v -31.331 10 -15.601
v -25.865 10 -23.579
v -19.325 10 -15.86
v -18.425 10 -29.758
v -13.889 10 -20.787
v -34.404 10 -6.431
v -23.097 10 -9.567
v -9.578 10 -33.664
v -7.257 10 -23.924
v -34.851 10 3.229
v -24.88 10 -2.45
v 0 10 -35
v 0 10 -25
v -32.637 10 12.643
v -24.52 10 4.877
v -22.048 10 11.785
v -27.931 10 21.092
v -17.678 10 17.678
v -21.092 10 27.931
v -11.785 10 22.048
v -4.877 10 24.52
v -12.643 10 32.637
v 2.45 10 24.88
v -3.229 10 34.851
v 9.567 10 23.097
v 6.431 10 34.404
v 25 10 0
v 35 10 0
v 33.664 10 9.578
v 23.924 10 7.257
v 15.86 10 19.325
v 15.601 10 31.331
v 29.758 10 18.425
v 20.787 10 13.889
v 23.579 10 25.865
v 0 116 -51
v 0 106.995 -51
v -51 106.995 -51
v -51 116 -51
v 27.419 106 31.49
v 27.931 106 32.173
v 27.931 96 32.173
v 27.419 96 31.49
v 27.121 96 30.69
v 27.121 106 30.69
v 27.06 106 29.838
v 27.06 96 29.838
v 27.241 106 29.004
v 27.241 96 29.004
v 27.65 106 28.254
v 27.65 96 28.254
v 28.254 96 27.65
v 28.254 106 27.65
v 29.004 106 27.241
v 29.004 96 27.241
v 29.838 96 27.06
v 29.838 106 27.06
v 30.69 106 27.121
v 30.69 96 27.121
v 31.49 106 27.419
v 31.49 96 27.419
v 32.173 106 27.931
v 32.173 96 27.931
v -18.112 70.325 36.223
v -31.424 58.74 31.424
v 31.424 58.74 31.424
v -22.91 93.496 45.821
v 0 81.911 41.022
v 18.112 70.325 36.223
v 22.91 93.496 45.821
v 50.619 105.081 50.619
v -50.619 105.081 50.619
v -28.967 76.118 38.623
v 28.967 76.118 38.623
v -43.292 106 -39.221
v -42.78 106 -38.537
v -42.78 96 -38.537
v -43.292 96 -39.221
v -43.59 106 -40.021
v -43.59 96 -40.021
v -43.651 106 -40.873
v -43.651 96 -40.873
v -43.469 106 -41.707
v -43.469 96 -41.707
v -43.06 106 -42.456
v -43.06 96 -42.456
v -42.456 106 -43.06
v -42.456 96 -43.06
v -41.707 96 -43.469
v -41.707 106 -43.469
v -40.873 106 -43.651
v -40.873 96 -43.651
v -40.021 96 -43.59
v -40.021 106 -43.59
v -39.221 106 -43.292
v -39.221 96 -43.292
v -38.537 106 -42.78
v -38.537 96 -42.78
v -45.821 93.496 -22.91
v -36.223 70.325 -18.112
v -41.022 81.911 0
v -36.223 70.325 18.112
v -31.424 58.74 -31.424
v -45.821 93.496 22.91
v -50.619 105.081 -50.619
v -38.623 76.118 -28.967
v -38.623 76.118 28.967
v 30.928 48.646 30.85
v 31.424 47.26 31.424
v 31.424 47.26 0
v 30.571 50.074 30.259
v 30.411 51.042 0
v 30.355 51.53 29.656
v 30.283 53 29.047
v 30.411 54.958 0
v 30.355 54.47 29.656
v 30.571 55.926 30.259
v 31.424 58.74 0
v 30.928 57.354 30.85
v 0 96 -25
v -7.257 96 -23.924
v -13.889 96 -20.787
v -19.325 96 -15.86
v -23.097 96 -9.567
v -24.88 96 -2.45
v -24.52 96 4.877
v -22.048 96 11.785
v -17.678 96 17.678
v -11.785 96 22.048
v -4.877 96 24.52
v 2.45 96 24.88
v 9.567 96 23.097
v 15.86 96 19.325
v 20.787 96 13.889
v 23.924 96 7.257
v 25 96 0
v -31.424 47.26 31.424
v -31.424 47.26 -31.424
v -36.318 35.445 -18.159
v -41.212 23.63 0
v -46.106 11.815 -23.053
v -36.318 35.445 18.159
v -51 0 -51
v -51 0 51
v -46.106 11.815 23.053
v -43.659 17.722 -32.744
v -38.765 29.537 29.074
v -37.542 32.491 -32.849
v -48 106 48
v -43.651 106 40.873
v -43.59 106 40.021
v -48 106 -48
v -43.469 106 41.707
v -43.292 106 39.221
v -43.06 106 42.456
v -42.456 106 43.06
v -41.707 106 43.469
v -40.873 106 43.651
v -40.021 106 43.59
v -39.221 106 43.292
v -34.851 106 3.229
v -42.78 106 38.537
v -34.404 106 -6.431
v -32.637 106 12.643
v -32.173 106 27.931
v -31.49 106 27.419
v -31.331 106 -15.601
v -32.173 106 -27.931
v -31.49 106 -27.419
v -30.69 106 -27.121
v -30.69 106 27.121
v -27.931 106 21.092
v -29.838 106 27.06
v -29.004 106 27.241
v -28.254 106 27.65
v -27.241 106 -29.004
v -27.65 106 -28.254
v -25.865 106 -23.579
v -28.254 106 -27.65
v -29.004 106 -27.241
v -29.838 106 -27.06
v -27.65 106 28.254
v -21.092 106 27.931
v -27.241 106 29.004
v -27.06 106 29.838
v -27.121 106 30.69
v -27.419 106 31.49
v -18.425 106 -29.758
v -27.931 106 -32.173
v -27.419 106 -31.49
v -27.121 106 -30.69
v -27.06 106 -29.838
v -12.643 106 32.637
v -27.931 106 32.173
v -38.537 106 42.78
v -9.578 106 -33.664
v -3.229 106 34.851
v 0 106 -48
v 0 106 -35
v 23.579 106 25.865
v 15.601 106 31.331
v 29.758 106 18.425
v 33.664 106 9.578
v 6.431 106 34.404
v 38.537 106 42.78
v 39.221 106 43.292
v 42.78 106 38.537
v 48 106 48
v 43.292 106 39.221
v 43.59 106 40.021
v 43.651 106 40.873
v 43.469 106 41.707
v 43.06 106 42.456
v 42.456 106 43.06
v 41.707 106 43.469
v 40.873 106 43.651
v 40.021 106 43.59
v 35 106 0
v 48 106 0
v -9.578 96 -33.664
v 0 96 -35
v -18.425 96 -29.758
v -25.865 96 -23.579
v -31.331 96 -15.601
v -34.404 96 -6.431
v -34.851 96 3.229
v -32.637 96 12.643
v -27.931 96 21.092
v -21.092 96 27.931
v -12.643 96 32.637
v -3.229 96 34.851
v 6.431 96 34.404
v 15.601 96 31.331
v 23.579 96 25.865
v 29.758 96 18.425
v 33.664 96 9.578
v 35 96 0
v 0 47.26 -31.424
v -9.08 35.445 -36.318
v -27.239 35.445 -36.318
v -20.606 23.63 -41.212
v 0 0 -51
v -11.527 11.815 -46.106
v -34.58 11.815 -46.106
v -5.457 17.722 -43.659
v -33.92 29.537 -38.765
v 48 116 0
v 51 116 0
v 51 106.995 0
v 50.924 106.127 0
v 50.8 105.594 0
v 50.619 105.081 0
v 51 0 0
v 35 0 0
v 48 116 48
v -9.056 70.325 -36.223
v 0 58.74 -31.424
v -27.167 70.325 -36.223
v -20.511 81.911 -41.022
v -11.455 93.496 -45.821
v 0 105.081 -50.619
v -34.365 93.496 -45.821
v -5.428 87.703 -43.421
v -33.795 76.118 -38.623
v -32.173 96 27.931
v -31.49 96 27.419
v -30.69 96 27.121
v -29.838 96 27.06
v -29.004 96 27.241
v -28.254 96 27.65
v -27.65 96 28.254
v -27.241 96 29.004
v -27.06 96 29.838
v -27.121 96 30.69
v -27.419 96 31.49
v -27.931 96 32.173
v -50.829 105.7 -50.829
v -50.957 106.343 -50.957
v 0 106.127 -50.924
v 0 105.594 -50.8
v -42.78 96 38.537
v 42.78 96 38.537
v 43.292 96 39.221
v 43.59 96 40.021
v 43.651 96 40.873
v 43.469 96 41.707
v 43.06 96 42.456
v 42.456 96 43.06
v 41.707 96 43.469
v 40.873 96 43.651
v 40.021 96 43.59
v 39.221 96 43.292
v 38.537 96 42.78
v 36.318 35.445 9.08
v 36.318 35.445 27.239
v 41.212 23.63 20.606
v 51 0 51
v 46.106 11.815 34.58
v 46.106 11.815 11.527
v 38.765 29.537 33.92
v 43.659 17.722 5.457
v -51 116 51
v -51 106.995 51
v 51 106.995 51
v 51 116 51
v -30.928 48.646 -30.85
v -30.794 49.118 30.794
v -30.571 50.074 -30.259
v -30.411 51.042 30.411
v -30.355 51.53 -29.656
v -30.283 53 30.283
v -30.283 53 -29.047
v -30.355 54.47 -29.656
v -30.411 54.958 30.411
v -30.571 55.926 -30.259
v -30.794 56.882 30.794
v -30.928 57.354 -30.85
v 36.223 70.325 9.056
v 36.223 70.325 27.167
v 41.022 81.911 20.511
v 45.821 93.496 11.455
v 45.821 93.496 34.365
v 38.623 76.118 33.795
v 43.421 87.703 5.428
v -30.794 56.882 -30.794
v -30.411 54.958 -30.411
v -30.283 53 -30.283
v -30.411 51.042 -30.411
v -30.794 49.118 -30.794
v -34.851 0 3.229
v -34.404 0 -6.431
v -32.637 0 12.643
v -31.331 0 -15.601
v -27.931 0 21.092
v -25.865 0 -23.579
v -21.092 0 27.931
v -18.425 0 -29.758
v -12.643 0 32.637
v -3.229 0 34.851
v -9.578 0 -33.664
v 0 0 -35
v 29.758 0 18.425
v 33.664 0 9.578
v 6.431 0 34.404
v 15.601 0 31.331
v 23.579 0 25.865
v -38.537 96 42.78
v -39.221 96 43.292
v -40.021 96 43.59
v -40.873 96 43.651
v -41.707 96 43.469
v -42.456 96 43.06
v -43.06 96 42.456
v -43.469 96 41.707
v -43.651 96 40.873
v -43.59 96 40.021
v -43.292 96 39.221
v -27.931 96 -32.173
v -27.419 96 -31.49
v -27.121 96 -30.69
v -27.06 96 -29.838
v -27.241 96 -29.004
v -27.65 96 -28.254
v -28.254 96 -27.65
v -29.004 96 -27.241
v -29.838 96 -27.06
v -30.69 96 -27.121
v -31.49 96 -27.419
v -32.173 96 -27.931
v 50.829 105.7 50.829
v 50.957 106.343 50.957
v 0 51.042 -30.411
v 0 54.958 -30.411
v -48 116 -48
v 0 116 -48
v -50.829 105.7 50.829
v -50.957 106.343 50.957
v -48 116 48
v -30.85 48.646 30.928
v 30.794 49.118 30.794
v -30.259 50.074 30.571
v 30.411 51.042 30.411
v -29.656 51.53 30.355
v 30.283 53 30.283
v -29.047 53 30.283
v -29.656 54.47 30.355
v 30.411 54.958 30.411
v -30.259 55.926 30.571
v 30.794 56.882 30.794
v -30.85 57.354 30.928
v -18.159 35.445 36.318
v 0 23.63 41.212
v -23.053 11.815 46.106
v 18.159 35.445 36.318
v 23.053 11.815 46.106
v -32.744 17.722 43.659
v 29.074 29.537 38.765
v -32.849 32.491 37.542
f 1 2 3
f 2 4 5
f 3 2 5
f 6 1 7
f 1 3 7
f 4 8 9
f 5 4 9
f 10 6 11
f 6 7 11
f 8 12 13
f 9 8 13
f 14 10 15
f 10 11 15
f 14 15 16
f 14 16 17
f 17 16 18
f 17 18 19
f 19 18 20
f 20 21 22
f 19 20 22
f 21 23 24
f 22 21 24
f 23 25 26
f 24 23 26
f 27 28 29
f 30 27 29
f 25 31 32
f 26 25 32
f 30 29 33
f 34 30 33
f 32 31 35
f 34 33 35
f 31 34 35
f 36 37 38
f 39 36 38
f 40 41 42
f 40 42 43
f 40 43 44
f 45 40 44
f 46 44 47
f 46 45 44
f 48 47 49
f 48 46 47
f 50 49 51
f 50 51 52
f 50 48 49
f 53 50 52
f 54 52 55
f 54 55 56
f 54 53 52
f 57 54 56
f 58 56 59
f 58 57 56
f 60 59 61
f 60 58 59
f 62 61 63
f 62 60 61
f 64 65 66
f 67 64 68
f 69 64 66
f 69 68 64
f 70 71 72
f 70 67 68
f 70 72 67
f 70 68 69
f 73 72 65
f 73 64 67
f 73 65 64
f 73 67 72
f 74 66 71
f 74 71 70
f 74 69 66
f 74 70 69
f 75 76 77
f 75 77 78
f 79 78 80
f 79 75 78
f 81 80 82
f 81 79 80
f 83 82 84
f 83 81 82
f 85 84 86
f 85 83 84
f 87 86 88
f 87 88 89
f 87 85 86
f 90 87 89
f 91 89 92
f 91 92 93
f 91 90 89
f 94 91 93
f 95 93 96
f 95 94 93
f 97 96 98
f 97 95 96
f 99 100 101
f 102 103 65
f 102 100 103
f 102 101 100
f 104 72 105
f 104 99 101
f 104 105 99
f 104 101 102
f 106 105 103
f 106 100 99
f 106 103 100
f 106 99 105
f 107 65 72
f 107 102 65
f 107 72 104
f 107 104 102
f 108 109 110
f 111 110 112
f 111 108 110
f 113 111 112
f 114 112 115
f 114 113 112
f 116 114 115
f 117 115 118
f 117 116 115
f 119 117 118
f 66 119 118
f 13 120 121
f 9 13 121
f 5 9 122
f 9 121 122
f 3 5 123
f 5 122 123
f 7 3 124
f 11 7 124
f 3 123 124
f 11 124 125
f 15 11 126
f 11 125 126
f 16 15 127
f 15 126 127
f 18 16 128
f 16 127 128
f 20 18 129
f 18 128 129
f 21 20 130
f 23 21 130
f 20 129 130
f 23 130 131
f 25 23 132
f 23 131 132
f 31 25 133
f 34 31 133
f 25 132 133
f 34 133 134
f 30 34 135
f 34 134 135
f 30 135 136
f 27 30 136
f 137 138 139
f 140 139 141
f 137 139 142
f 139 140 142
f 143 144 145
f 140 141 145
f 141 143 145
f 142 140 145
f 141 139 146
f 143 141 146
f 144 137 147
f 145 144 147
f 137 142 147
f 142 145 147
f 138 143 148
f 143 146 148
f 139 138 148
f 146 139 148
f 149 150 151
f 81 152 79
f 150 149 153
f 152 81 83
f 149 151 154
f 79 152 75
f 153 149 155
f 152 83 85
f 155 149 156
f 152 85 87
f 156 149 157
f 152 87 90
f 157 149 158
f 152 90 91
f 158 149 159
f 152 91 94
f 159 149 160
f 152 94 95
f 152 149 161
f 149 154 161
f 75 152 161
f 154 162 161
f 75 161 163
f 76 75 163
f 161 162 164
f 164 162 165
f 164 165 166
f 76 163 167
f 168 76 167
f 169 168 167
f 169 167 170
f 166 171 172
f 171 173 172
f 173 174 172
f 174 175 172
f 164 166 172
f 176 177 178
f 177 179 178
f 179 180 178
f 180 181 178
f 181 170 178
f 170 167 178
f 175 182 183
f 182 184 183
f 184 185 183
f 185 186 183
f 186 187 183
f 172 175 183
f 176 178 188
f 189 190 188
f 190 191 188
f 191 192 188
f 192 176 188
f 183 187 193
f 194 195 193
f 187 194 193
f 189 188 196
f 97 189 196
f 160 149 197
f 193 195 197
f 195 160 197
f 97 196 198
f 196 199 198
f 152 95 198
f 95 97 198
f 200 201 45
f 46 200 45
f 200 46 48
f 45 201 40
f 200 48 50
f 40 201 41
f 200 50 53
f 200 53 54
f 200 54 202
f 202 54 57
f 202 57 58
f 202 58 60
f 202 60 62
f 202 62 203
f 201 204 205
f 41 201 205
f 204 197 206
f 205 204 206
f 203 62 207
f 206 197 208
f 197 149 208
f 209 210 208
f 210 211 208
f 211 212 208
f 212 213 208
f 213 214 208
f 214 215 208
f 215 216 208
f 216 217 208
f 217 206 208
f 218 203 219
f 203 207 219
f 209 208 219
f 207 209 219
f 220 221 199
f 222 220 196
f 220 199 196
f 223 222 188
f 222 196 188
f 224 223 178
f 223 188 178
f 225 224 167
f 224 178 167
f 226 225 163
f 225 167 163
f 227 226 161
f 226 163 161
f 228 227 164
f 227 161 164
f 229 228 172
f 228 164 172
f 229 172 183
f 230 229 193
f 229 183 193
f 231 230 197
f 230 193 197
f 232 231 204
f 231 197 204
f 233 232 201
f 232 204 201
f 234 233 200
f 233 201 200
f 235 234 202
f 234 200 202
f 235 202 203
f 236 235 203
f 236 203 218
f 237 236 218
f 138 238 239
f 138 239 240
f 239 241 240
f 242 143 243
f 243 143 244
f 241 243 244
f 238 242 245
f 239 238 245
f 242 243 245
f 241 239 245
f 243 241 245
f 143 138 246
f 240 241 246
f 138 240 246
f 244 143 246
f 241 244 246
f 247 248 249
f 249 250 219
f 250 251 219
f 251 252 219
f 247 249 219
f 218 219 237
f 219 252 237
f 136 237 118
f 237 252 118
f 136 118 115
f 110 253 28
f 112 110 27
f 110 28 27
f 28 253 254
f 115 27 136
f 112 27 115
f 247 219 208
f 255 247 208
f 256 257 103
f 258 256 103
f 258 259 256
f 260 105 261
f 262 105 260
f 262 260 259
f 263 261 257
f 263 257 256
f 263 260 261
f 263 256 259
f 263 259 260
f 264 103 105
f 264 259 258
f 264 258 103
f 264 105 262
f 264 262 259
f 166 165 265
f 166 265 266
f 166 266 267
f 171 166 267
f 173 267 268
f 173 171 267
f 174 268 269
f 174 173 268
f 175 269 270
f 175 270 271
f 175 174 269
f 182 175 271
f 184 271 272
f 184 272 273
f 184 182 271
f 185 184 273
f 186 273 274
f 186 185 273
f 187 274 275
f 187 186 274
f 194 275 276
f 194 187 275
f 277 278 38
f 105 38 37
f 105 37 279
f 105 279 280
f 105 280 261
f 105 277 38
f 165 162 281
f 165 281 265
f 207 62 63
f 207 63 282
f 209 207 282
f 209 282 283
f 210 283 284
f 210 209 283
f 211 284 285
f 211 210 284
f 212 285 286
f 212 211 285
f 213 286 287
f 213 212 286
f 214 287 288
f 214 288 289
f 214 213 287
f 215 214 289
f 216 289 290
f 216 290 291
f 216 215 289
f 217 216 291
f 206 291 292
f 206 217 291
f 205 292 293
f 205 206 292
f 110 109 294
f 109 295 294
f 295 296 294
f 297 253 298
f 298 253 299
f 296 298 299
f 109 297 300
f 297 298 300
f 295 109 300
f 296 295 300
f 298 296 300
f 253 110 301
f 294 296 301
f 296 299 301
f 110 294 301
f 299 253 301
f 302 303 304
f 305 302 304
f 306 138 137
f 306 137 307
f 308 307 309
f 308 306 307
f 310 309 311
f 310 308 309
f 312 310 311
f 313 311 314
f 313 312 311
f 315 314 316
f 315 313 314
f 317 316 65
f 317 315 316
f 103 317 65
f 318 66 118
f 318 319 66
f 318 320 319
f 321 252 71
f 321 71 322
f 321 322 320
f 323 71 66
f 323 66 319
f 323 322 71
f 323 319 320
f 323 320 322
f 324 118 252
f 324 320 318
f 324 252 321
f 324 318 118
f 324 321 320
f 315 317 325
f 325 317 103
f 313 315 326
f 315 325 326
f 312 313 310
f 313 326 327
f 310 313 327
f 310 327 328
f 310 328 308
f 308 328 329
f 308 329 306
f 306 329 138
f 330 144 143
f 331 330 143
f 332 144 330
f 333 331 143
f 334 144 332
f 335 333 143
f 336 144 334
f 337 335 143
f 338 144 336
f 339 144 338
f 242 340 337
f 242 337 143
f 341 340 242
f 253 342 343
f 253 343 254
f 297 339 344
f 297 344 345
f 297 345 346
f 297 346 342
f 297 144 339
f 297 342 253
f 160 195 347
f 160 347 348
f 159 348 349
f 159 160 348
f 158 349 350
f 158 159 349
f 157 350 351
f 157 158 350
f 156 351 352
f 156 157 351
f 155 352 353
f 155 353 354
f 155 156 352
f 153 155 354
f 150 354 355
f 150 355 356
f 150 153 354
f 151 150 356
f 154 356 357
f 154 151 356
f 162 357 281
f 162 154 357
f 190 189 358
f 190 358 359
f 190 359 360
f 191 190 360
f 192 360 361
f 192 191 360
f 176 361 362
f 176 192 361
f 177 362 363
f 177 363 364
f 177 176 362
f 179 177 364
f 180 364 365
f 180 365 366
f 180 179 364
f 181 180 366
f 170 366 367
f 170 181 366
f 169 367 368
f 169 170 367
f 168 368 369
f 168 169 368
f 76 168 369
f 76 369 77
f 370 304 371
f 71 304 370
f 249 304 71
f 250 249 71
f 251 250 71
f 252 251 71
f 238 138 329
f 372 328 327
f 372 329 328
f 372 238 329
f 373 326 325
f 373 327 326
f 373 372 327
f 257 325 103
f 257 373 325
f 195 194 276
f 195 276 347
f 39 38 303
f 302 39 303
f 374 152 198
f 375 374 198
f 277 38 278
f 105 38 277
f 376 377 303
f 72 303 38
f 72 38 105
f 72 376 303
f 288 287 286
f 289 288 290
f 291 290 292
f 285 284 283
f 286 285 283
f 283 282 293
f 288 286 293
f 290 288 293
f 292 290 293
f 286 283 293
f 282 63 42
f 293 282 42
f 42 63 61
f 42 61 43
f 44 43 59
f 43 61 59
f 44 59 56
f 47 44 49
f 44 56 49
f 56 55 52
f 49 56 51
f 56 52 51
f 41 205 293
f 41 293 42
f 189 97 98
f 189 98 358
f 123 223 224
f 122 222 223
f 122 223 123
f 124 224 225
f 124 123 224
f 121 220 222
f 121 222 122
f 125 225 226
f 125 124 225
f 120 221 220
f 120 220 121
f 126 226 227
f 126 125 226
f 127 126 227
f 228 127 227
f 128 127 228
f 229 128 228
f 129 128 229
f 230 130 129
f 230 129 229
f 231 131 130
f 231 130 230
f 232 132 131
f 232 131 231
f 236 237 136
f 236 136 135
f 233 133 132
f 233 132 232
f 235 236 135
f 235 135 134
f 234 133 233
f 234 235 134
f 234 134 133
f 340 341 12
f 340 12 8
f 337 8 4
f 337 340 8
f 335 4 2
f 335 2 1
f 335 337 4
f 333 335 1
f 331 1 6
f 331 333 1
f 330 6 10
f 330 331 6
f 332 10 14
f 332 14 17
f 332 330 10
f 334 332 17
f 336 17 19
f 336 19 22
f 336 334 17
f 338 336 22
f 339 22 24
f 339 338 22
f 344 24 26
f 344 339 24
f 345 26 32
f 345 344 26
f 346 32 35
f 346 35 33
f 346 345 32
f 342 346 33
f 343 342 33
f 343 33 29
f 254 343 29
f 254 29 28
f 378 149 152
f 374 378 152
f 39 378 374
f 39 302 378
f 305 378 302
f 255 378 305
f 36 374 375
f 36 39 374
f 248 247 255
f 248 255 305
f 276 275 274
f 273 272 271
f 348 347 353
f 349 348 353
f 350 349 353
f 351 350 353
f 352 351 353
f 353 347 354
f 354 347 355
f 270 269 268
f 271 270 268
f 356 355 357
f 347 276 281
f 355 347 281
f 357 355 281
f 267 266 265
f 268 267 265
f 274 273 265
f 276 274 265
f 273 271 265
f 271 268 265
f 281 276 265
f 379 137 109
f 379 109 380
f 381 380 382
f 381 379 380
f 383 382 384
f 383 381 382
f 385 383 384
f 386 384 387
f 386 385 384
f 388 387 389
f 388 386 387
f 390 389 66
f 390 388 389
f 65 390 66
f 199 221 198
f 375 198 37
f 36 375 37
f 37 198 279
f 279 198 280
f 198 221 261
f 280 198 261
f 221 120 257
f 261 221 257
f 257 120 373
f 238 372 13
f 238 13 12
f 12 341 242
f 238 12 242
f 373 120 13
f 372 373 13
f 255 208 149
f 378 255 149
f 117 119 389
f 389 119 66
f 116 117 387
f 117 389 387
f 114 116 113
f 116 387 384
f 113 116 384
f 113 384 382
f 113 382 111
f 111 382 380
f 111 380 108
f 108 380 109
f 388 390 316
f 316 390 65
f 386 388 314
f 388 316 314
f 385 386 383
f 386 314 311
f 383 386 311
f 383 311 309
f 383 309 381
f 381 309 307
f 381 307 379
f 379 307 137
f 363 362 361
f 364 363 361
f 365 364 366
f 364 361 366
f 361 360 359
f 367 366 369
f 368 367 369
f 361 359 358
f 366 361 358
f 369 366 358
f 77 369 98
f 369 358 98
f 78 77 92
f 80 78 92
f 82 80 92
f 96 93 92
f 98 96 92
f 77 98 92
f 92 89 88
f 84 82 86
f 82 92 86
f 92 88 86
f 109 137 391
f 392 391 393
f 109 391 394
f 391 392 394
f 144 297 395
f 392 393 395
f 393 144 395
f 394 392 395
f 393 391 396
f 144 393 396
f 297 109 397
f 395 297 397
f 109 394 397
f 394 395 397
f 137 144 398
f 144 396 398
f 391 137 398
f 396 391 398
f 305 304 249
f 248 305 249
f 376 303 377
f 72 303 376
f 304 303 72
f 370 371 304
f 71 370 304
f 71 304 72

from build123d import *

# Parameters (mm, degrees)
SKETCH3_R           = 25
CUT_EXTRUDE1_DEPTH  = 129.210764141
SKETCH4_R           = 35
CUT_EXTRUDE2_DEPTH  = 10
FILLET1_R           = 15
SKETCH5_W           = 51
SKETCH5_H           = 51
CUT_EXTRUDE3_DEPTH  = 129.210764141
BOSS_EXTRUDE1_DEPTH = 10
CUT_EXTRUDE4_DEPTH  = 10
FILLET2_R           = 5


with BuildPart() as part:
    # Sketch2 → Loft1 section 0
    with BuildSketch(Plane(origin=(0, 53, 0), x_dir=(1, 0, 0), z_dir=(0, 1, 0))):
        with BuildLine():
            Line((-29.0467, -29.0467), (29.0467, -29.0467))
            Line((29.0467, -29.0467), (29.0467, 29.0467))
            Line((29.0467, 29.0467), (-29.0467, 29.0467))
            Line((-29.0467, 29.0467), (-29.0467, -29.0467))
        make_face()
    # Sketch1 → Loft1 section 1
    with BuildSketch(Plane(origin=(0, 0, 0), x_dir=(1, 0, 0), z_dir=(0, 1, 0))):
        with BuildLine():
            Line((-51, -51), (51, -51))
            Line((51, -51), (51, 51))
            Line((51, 51), (-51, 51))
            Line((-51, 51), (-51, -51))
        make_face()
    loft1 = loft()

    # Mirror1: Loft1 across plane
    add(loft1.mirror(Plane.ZX.offset(53)))

    # Sketch3 → Cut-Extrude1 (cut, through all)
    with BuildSketch(Plane(origin=(0, 106, 0), x_dir=(1, 0, 0), z_dir=(0, 1, 0))):
        with Locations(Location((0, 0, 0), (0, 0, 270))):
            Circle(SKETCH3_R)
    extrude(amount=-CUT_EXTRUDE1_DEPTH, mode=Mode.SUBTRACT)

    # Sketch4 → Cut-Extrude2 (cut)
    with BuildSketch(Plane(origin=(0, 106, 0), x_dir=(1, 0, 0), z_dir=(0, 1, 0))):
        with Locations(Location((0, 0, 0), (0, 0, 270))):
            Circle(SKETCH4_R)
    cut_extrude2 = extrude(amount=-CUT_EXTRUDE2_DEPTH, mode=Mode.SUBTRACT)

    # Mirror2: Cut-Extrude2 across plane
    add(cut_extrude2.mirror(Plane.ZX.offset(53)), mode=Mode.SUBTRACT)

    # Fillet1
    # the kernel refuses this fillet: 15 mm, written as the material it adds along each edge
    with BuildSketch(Plane(origin=(44.579695283, 53, -29.0467), x_dir=(0, -0.923879648411862, -0.38268315255622926), z_dir=(-1, 0, 0))) as fillet1_piece_1_section:
        with BuildLine():
            CenterArc((FILLET1_R * 0.414213207547, -FILLET1_R), FILLET1_R, 90, 44.999965294)
            Line((-FILLET1_R * 0.292893145326, -FILLET1_R * 0.292892790501), (0, 0))
            Line((0, 0), (FILLET1_R * 0.414213207547, 0))
        make_face()
    fillet1_piece_1 = extrude(amount=89.159390566, mode=Mode.PRIVATE)
    fillet1_piece_1 = fillet1_piece_1 - Plane(origin=(-45.282580968, 53, -29.0467), x_dir=(0.9238796484118622, -0.3826831525562288, 0), z_dir=(0, 0, -1)) * Cylinder(15, 204, mode=Mode.PRIVATE)
    fillet1_piece_1 = fillet1_piece_1 - Plane(origin=(45.282580968, 53, -29.0467), x_dir=(-0.9238796484118622, -0.3826831525562288, 0), z_dir=(0, 0, 1)) * Cylinder(15, 204, mode=Mode.PRIVATE)
    add(fillet1_piece_1)
    with BuildSketch(Plane(origin=(-29.0467, 53, -44.579695283), x_dir=(-0.3826831525562283, -0.9238796484118624, 0), z_dir=(0, 0, 1))) as fillet1_piece_2_section:
        with BuildLine():
            CenterArc((FILLET1_R * 0.414213207547, -FILLET1_R), FILLET1_R, 90, 44.999965294)
            Line((-FILLET1_R * 0.292893145326, -FILLET1_R * 0.292892790501), (0, 0))
            Line((0, 0), (FILLET1_R * 0.414213207547, 0))
        make_face()
    fillet1_piece_2 = extrude(amount=89.159390566, mode=Mode.PRIVATE)
    fillet1_piece_2 = fillet1_piece_2 - Plane(origin=(-29.0467, 53, 45.282580968), x_dir=(0, -0.3826831525562288, -0.9238796484118622), z_dir=(-1, 0, 0)) * Cylinder(15, 204, mode=Mode.PRIVATE)
    fillet1_piece_2 = fillet1_piece_2 - Plane(origin=(-29.0467, 53, -45.282580968), x_dir=(0, -0.3826831525562288, 0.9238796484118622), z_dir=(1, 0, 0)) * Cylinder(15, 204, mode=Mode.PRIVATE)
    add(fillet1_piece_2)
    with BuildSketch(Plane(origin=(-44.579695283, 53, 29.0467), x_dir=(0, -0.923879648411862, 0.38268315255622926), z_dir=(1, 0, 0))) as fillet1_piece_3_section:
        with BuildLine():
            CenterArc((FILLET1_R * 0.414213207547, -FILLET1_R), FILLET1_R, 90, 44.999965294)
            Line((-FILLET1_R * 0.292893145326, -FILLET1_R * 0.292892790501), (0, 0))
            Line((0, 0), (FILLET1_R * 0.414213207547, 0))
        make_face()
    fillet1_piece_3 = extrude(amount=89.159390566, mode=Mode.PRIVATE)
    fillet1_piece_3 = fillet1_piece_3 - Plane(origin=(-45.282580968, 53, 29.0467), x_dir=(0.9238796484118622, -0.3826831525562288, 0), z_dir=(0, 0, -1)) * Cylinder(15, 204, mode=Mode.PRIVATE)
    fillet1_piece_3 = fillet1_piece_3 - Plane(origin=(45.282580968, 53, 29.0467), x_dir=(-0.9238796484118622, -0.3826831525562288, 0), z_dir=(0, 0, 1)) * Cylinder(15, 204, mode=Mode.PRIVATE)
    add(fillet1_piece_3)
    with BuildSketch(Plane(origin=(29.0467, 53, 44.579695283), x_dir=(0.3826831525562283, -0.9238796484118624, 0), z_dir=(0, 0, -1))) as fillet1_piece_4_section:
        with BuildLine():
            CenterArc((FILLET1_R * 0.414213207547, -FILLET1_R), FILLET1_R, 90, 44.999965294)
            Line((-FILLET1_R * 0.292893145326, -FILLET1_R * 0.292892790501), (0, 0))
            Line((0, 0), (FILLET1_R * 0.414213207547, 0))
        make_face()
    fillet1_piece_4 = extrude(amount=89.159390566, mode=Mode.PRIVATE)
    fillet1_piece_4 = fillet1_piece_4 - Plane(origin=(29.0467, 53, 45.282580968), x_dir=(0, -0.3826831525562288, -0.9238796484118622), z_dir=(-1, 0, 0)) * Cylinder(15, 204, mode=Mode.PRIVATE)
    fillet1_piece_4 = fillet1_piece_4 - Plane(origin=(29.0467, 53, -45.282580968), x_dir=(0, -0.3826831525562288, 0.9238796484118622), z_dir=(1, 0, 0)) * Cylinder(15, 204, mode=Mode.PRIVATE)
    add(fillet1_piece_4)

    # Sketch5 → Cut-Extrude3 (cut, through all)
    with BuildSketch(Plane(origin=(0, 106, 0), x_dir=(1, 0, 0), z_dir=(0, 1, 0))):
        with Locations((25.5, 25.5)):
            Rectangle(SKETCH5_W, SKETCH5_H)
    extrude(amount=-CUT_EXTRUDE3_DEPTH, mode=Mode.SUBTRACT)

    # Sketch6 → Boss-Extrude1 (add)
    with BuildSketch(Plane(origin=(0, 106, 0), x_dir=(1, 0, 0), z_dir=(0, 1, 0))):
        Polygon((0, 51), (-51, 51), (-51, -51), (51, -51), (51, 0), (48, 0), (48, -48), (-48, -48), (-48, 48), (0, 48), align=None)
    extrude(amount=BOSS_EXTRUDE1_DEPTH)

    # Sketch7 → Cut-Extrude4 (cut)
    with BuildSketch(Plane(origin=(0, 106, 0), x_dir=(1, 0, 0), z_dir=(0, 1, 0))):
        with BuildLine():
            Line((-32.173358544, 27.930717857), (-42.779960262, 38.537319575))
            ThreePointArc((-42.779960262, 38.537319575), (-42.779960262, 42.779960262), (-38.537319575, 42.779960262))
            Line((-38.537319575, 42.779960262), (-27.930717857, 32.173358544))
            ThreePointArc((-27.930717857, 32.173358544), (-27.930717857, 27.930717857), (-32.173358544, 27.930717857))
        make_face()
        with BuildLine():
            Line((27.930717857, 32.173358544), (38.537319575, 42.779960262))
            ThreePointArc((38.537319575, 42.779960262), (42.779960262, 42.779960262), (42.779960262, 38.537319575))
            Line((42.779960262, 38.537319575), (32.173358544, 27.930717857))
            ThreePointArc((32.173358544, 27.930717857), (27.930717857, 27.930717857), (27.930717857, 32.173358544))
        make_face()
        with BuildLine():
            Line((32.173358544, -27.930717857), (42.779960262, -38.537319575))
            ThreePointArc((42.779960262, -38.537319575), (42.779960262, -42.779960262), (38.537319575, -42.779960262))
            Line((38.537319575, -42.779960262), (27.930717857, -32.173358544))
            ThreePointArc((27.930717857, -32.173358544), (27.930717857, -27.930717857), (32.173358544, -27.930717857))
        make_face()
        with BuildLine():
            Line((-27.930717857, -32.173358544), (-38.537319575, -42.779960262))
            ThreePointArc((-38.537319575, -42.779960262), (-42.779960262, -42.779960262), (-42.779960262, -38.537319575))
            Line((-42.779960262, -38.537319575), (-32.173358544, -27.930717857))
            ThreePointArc((-32.173358544, -27.930717857), (-27.930717857, -27.930717857), (-27.930717857, -32.173358544))
        make_face()
    extrude(amount=-CUT_EXTRUDE4_DEPTH, mode=Mode.SUBTRACT)

    # Fillet2
    fillet2_edges = [part.edges().sort_by_distance(p)[0] for p in [
        (-25.5, 106, -51),
        (-51, 106, 0),
        (51, 106, 25.5),
        (0, 106, 51),
    ]]
    fillet(fillet2_edges, radius=FILLET2_R)


solid = part.part
